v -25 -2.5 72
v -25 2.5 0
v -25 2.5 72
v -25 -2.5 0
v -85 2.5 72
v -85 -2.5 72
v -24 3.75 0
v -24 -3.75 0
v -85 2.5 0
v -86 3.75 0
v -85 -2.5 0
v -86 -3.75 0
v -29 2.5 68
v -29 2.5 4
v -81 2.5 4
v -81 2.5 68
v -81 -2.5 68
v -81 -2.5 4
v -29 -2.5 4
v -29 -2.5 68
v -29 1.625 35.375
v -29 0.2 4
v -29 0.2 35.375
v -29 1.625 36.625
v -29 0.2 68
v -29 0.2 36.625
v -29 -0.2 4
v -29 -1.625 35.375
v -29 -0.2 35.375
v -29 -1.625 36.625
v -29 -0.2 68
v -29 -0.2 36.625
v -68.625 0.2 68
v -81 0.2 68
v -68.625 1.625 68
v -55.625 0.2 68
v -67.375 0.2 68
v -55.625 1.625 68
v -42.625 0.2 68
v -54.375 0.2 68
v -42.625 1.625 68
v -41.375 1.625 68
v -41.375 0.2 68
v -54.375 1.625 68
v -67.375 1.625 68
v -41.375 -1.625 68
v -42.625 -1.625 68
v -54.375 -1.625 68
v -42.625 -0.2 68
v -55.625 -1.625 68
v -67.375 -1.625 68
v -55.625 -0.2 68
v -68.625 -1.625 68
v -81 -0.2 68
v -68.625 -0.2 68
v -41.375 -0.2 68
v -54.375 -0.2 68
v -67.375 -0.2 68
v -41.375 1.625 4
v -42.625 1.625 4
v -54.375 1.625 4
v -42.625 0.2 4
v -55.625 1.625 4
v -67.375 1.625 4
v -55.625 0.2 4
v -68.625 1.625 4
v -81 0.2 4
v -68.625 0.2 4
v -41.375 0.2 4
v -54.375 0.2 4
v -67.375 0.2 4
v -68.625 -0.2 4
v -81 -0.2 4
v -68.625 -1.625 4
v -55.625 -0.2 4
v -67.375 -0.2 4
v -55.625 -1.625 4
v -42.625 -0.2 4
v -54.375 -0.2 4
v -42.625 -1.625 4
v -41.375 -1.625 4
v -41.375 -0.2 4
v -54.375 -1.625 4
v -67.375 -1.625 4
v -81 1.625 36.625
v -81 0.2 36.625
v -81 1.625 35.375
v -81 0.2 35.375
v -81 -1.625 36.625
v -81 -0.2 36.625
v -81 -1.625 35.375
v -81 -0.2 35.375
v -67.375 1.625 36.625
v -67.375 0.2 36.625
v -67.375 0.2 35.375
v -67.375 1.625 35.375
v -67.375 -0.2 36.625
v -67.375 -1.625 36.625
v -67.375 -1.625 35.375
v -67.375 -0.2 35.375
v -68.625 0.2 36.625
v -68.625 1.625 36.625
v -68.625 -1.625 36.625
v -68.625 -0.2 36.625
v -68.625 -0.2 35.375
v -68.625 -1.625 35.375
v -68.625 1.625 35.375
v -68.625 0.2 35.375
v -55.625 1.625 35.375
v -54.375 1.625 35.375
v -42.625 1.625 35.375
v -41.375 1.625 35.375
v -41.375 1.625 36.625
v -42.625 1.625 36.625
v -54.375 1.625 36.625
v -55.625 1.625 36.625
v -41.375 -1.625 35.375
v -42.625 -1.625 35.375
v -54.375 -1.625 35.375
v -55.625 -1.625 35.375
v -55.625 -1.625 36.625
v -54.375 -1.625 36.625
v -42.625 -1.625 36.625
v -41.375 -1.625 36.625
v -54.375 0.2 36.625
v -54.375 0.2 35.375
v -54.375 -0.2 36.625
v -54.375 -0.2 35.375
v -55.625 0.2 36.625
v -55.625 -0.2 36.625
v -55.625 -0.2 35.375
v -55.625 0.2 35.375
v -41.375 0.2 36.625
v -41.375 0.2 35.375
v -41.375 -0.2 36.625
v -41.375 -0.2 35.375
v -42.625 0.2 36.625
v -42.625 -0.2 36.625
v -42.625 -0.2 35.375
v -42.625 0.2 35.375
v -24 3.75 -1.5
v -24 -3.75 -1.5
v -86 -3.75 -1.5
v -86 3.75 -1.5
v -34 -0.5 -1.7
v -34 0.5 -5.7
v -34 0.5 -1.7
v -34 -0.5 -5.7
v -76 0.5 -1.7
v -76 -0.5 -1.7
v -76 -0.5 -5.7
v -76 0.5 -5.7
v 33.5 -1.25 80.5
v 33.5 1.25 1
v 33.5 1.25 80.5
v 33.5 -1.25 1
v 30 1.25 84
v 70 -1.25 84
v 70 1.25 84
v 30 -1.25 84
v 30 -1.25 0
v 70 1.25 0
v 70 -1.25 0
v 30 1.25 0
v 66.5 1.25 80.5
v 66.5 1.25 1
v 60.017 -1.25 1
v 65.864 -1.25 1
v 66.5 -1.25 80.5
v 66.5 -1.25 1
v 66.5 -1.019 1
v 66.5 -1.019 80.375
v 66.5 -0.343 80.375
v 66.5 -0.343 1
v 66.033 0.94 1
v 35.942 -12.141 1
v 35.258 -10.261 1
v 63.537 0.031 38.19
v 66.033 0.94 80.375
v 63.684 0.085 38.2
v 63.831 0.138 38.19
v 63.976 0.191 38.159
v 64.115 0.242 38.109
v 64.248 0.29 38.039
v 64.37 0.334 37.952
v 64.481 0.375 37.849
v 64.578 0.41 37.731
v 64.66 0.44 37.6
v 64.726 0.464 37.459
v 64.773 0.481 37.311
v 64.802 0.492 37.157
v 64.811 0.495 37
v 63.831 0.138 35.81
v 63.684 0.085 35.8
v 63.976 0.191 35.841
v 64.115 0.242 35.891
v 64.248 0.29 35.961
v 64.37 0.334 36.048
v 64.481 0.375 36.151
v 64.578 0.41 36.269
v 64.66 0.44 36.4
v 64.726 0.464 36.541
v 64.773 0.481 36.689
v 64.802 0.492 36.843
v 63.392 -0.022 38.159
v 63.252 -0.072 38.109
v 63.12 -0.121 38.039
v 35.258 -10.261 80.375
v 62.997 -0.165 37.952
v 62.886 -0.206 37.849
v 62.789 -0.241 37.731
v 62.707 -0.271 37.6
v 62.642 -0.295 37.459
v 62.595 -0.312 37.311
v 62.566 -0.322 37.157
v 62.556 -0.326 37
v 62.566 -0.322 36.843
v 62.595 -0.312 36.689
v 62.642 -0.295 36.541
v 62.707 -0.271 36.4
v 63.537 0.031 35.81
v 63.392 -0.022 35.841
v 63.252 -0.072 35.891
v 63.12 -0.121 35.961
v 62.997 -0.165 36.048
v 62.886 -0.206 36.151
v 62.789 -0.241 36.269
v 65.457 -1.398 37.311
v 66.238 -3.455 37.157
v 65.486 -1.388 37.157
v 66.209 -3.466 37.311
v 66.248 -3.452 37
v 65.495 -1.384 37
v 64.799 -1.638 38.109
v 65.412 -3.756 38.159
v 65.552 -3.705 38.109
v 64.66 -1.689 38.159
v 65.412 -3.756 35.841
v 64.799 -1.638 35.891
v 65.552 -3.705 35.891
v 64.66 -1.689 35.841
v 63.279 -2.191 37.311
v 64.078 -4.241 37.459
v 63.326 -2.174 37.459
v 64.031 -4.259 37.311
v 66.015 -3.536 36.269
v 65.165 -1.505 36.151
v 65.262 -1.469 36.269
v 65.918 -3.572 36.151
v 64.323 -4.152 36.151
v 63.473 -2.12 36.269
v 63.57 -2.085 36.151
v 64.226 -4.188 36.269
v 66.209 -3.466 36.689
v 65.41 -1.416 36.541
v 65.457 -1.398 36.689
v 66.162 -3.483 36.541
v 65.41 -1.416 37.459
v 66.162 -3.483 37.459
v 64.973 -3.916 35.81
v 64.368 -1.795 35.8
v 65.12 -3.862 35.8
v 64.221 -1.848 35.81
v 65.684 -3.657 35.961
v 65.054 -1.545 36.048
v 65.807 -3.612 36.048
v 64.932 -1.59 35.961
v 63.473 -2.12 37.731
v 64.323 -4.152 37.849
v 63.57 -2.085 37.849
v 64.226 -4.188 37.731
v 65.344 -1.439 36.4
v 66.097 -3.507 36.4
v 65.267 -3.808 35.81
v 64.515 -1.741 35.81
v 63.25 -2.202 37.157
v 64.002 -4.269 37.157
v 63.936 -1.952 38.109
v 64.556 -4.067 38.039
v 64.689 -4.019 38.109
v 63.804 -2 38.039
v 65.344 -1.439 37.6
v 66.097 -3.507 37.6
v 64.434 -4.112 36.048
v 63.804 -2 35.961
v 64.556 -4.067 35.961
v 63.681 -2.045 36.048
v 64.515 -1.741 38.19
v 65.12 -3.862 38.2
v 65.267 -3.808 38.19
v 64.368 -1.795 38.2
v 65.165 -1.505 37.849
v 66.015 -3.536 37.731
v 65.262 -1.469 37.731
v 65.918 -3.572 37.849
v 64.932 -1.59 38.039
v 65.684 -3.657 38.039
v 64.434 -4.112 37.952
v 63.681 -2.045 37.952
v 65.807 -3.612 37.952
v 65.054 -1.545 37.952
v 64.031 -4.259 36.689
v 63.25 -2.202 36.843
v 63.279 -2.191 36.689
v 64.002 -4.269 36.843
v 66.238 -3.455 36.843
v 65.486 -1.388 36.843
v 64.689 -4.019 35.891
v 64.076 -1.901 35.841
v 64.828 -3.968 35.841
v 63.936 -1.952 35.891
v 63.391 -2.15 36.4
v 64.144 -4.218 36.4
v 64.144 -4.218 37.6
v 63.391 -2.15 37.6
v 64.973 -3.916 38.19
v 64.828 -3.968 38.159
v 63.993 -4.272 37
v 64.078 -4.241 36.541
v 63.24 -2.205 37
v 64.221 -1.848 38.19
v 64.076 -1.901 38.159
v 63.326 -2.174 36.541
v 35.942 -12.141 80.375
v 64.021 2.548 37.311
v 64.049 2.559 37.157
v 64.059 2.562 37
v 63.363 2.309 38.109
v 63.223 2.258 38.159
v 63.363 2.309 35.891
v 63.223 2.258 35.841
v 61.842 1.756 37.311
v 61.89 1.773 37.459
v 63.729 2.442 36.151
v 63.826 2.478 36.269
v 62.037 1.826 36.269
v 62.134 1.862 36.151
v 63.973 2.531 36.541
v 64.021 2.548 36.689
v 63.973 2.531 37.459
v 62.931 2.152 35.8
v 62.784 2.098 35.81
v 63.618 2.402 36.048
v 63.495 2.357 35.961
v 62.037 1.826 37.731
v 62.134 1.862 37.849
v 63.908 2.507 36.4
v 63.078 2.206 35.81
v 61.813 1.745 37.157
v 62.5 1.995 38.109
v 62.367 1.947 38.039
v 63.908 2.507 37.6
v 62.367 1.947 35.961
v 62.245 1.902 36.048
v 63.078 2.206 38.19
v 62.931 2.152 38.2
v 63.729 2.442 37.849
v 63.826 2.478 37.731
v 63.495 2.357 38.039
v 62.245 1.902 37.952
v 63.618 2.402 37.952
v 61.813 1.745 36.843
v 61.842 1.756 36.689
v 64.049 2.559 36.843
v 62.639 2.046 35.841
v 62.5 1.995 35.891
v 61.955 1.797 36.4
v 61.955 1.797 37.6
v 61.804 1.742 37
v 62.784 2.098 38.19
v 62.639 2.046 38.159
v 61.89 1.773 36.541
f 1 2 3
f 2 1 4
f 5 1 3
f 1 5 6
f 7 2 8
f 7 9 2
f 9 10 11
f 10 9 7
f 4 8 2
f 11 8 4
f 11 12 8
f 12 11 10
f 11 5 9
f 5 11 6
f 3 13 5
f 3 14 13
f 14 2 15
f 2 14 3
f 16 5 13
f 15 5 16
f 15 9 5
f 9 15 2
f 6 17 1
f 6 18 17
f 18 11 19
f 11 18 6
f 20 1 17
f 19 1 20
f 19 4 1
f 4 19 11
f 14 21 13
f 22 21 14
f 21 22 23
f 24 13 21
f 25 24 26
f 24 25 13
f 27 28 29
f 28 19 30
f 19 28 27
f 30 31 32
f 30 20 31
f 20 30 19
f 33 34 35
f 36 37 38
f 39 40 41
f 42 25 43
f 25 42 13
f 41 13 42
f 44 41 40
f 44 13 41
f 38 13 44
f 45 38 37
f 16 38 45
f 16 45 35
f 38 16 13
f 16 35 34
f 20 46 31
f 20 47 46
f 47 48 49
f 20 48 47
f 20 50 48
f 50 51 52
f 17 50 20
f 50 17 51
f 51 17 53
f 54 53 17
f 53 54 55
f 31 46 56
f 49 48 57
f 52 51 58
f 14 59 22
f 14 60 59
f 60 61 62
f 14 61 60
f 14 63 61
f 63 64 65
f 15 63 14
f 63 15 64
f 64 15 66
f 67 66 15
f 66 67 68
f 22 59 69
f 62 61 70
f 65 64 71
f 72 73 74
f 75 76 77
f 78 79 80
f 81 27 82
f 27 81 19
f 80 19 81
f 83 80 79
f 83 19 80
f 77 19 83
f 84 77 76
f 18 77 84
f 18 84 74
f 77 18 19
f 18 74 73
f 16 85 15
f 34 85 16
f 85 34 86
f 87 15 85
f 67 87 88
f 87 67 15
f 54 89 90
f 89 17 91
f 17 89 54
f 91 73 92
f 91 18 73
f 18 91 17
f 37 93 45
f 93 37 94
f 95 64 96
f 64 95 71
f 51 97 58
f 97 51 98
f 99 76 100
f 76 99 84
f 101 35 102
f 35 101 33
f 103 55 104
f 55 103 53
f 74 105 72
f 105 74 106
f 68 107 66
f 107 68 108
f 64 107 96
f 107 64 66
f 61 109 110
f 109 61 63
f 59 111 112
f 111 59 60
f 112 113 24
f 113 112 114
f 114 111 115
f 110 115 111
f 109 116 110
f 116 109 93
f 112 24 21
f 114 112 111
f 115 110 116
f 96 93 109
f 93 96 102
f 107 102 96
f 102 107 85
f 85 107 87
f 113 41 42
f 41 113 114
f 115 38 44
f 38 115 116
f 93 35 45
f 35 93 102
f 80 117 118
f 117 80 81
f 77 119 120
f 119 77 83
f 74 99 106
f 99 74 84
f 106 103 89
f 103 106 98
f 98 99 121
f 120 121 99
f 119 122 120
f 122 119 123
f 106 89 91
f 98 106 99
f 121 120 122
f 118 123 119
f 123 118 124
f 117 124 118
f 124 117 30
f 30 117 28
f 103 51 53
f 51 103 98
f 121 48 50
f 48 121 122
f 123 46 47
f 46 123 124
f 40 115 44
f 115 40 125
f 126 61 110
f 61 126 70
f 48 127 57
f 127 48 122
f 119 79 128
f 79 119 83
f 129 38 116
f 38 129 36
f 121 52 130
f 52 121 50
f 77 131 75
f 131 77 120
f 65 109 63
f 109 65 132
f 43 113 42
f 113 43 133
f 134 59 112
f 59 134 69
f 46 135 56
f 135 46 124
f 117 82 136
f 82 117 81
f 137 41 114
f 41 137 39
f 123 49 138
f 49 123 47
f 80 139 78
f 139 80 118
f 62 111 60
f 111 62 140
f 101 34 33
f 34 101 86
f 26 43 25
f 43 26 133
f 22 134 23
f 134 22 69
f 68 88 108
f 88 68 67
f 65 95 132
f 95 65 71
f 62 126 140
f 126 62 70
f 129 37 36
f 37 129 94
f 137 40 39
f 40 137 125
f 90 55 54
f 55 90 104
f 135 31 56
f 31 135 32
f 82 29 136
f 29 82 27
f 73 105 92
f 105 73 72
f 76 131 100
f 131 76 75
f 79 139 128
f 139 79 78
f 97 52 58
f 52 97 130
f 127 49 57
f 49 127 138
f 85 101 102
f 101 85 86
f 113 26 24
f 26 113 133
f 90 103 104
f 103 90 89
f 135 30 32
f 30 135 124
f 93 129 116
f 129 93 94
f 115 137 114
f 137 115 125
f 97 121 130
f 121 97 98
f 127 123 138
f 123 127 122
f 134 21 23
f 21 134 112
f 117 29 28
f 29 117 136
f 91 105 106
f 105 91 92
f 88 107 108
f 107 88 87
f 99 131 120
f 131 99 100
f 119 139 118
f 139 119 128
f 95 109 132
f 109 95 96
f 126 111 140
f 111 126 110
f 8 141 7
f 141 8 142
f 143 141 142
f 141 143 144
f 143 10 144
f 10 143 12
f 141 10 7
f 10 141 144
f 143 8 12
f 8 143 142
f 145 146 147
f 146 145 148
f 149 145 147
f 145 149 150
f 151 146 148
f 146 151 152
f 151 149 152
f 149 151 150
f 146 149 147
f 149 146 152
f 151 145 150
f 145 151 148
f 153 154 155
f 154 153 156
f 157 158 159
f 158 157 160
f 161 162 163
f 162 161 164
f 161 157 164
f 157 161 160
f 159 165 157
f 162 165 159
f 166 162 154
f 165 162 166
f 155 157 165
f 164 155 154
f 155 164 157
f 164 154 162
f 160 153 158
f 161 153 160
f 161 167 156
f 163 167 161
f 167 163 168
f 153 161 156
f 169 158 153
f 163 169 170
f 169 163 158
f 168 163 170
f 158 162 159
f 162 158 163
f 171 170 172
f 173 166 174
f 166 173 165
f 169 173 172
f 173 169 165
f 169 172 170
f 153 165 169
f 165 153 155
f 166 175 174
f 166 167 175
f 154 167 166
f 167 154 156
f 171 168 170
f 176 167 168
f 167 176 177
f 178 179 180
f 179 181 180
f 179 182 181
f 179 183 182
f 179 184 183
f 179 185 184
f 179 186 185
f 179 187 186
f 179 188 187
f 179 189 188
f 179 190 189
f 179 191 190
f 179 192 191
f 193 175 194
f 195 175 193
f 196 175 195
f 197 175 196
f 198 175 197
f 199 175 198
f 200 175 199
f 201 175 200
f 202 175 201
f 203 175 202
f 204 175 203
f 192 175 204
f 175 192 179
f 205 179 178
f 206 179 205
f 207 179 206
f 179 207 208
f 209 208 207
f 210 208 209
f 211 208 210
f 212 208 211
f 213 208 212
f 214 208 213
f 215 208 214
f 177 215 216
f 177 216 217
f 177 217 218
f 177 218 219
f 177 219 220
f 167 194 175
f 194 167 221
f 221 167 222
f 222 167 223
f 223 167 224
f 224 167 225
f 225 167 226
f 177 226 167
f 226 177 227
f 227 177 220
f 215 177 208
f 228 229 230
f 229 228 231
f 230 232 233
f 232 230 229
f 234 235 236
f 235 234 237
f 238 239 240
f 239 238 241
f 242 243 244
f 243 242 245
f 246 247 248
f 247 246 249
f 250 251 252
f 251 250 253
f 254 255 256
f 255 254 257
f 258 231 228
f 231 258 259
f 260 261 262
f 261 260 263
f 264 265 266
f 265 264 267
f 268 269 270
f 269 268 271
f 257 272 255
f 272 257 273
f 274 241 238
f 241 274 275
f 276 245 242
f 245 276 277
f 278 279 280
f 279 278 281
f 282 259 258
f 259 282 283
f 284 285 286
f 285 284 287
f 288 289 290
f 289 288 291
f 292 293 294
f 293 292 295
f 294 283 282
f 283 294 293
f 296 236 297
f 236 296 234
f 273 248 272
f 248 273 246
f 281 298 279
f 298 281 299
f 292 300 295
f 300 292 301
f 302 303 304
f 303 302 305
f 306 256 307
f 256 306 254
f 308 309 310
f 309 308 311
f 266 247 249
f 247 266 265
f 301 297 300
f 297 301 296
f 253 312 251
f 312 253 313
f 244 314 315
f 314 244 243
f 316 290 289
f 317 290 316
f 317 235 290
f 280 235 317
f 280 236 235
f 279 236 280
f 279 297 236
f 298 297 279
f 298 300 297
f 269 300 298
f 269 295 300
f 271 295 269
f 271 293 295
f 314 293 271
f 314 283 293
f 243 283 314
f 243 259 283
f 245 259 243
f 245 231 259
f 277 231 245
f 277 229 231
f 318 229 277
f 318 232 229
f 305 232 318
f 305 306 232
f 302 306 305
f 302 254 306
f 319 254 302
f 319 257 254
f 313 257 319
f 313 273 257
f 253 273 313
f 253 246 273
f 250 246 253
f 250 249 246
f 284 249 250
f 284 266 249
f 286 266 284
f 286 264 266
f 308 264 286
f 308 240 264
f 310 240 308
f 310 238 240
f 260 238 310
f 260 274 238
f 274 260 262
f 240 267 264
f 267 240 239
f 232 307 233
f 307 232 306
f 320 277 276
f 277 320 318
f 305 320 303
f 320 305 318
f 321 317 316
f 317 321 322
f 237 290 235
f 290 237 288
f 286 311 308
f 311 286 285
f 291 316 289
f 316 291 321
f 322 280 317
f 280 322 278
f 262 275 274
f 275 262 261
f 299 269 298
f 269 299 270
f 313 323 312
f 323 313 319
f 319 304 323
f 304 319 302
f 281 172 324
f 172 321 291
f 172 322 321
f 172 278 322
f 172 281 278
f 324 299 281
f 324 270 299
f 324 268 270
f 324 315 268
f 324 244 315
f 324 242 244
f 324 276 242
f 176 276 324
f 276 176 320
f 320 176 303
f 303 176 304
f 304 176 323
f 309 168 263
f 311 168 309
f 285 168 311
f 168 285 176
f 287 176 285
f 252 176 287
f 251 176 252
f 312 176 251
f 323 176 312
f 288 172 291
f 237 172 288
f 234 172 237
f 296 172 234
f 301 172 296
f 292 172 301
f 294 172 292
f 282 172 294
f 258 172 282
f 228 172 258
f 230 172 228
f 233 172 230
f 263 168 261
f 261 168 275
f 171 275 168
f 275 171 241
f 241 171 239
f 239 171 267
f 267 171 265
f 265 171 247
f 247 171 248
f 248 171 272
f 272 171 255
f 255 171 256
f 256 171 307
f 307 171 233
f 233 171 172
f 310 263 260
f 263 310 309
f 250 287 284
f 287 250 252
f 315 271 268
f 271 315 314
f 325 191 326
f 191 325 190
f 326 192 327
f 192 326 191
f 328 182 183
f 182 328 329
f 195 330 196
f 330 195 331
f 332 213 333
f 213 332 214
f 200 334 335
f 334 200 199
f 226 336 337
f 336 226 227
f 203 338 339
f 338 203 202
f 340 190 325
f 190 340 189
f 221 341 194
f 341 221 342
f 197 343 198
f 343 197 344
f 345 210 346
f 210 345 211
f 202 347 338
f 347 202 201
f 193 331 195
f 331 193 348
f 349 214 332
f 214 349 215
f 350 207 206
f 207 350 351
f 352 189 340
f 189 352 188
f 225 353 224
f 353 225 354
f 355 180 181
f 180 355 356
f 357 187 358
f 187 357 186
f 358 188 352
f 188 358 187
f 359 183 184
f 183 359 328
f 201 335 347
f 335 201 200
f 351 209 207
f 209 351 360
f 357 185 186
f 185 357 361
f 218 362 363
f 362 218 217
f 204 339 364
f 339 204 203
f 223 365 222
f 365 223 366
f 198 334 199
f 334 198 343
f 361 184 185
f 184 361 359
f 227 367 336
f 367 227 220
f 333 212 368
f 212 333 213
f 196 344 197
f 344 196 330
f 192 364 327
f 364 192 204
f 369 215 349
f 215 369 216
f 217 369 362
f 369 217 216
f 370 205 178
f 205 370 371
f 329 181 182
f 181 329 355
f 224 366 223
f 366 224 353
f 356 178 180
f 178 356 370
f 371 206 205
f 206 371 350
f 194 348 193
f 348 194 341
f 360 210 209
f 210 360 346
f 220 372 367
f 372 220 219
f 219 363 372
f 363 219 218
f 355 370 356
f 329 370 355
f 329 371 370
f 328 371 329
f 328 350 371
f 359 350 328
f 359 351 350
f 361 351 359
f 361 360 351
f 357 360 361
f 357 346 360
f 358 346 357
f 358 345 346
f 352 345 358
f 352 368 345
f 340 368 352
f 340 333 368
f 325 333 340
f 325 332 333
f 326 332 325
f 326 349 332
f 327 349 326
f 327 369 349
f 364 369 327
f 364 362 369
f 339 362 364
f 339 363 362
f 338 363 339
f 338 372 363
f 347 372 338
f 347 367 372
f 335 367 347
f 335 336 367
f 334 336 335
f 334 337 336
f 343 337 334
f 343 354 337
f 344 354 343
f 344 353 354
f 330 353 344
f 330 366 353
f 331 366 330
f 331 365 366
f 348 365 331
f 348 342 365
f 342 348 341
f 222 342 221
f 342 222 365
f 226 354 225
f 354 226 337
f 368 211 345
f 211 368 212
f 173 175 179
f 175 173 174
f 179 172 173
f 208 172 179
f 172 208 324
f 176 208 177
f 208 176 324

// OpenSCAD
// file: ../architectural_openings.scad
/*
  Parametric architectural openings library for OpenSCAD.
  OpenSCAD does not support classes, so this file uses reusable modules
  with named parameters to provide a class-like API.
*/

$fn = 48;

function clamp(value, low, high) = min(max(value, low), high);
function inner_size(outer, border) = max(outer - (border * 2), 0.01);

module box_centered(size) {
    translate([-size[0] / 2, -size[1] / 2, 0]) cube(size);
}

module frame_ring(width, depth, height, thickness) {
    inner_w = inner_size(width, thickness);
    inner_h = inner_size(height, thickness);

    difference() {
        box_centered([width, depth, height]);
        translate([0, 0, thickness])
            box_centered([inner_w, depth + 0.2, inner_h]);
    }
}

module door_frame(width, depth, height, thickness, threshold_height = 0) {
    clear_width = inner_size(width, thickness);

    translate([-(width - thickness) / 2, 0, 0])
        box_centered([thickness, depth, height]);

    translate([(width - thickness) / 2, 0, 0])
        box_centered([thickness, depth, height]);

    translate([0, 0, height - thickness])
        box_centered([width, depth, thickness]);

    if (threshold_height > 0) {
        translate([0, 0, 0])
            box_centered([clear_width, depth, threshold_height]);
    }
}

module trim_piece(width, depth, height, z = 0) {
    translate([0, 0, z]) box_centered([width, depth, height]);
}

module glass_panel(width, depth, height, z = 0) {
    color([0.70, 0.88, 0.98, 0.45])
        translate([0, 0, z]) box_centered([width, depth, height]);
}

module mullion_bar(length, thickness, depth, vertical = true, z = 0) {
    if (vertical) {
        translate([0, 0, z]) box_centered([thickness, depth, length]);
    } else {
        translate([0, 0, z]) box_centered([length, depth, thickness]);
    }
}

module decorative_door_panels(clear_width, slab_depth, clear_height, inset = 3, rail = 6) {
    panel_gap = rail;
    margin = rail * 1.2;
    panel_width = max((clear_width - margin * 2 - panel_gap) / 2, clear_width * 0.2);
    panel_height = max((clear_height - margin * 2 - panel_gap) / 2, clear_height * 0.2);
    emboss_depth = min(inset, slab_depth * 0.25);
    z_positions = [
        margin,
        margin + panel_height + panel_gap
    ];

    for (x_sign = [-1, 1]) {
        for (z_offset = z_positions) {
            x_offset = x_sign * (panel_width / 2 + panel_gap / 2);

            translate([x_offset, slab_depth / 2 - emboss_depth / 2, z_offset])
                difference() {
                    box_centered([panel_width, emboss_depth, panel_height]);
                    box_centered([
                        max(panel_width - rail * 2, 0.01),
                        emboss_depth + 0.1,
                        max(panel_height - rail * 2, 0.01)
                    ]);
                }
        }
    }
}

module door_leaf(
    width,
    depth,
    height,
    decorative = true,
    knob_radius = 1.2,
    knob_length = 2.2,
    knob_height = 36,
    knob_backset = 2.5
) {
    box_centered([width, depth, height]);

    if (decorative) {
        decorative_door_panels(
            clear_width = width * 0.82,
            slab_depth = depth,
            clear_height = height * 0.78
        );
    }

    knob_x = width / 2 - knob_backset;
    knob_z = clamp(knob_height, 6, height - 6);

    for (side = [-1, 1]) {
        translate([knob_x, side * (depth / 2 + knob_length / 2), knob_z])
            rotate([90, 0, 0])
                cylinder(h = knob_length, r = knob_radius, center = true);
    }
}

module window_unit(
    width = 48,
    depth = 5,
    height = 60,
    frame_thickness = 4,
    pane_cols = 2,
    pane_rows = 2,
    mullions = true,
    mullion_thickness = 1.25,
    has_sill = true,
    sill_height = 1.5,
    sill_projection = 2,
    has_apron = false,
    apron_height = 4,
    apron_thickness = 1,
    glass_thickness = 0.4
) {
    cols = max(floor(pane_cols), 1);
    rows = max(floor(pane_rows), 1);
    glass_width = inner_size(width, frame_thickness);
    glass_height = inner_size(height, frame_thickness);
    glass_z = frame_thickness;

    frame_ring(width, depth, height, frame_thickness);
    glass_panel(glass_width, glass_thickness, glass_height, glass_z);

    if (mullions && cols > 1) {
        pane_clear_w = glass_width / cols;

        for (i = [1 : cols - 1]) {
            x_pos = -glass_width / 2 + pane_clear_w * i;
            translate([x_pos, 0, frame_thickness])
                mullion_bar(glass_height, mullion_thickness, depth * 0.65, true);
        }
    }

    if (mullions && rows > 1) {
        pane_clear_h = glass_height / rows;

        for (i = [1 : rows - 1]) {
            z_pos = frame_thickness + pane_clear_h * i - mullion_thickness / 2;
            translate([0, 0, z_pos])
                mullion_bar(glass_width, mullion_thickness, depth * 0.65, false);
        }
    }

    if (has_sill) {
        trim_piece(
            width = width + frame_thickness * 0.5,
            depth = depth + sill_projection,
            height = sill_height,
            z = -sill_height
        );
    }

    if (has_apron) {
        trim_piece(
            width = width * 0.7,
            depth = apron_thickness,
            height = apron_height,
            z = -(has_sill ? sill_height : 0) - apron_height - 0.2
        );
    }
}

module door_unit(
    width = 36,
    depth = 2,
    height = 80,
    include_frame = true,
    frame_thickness = 3.5,
    functional = false,
    open_angle = 0,
    hinge = "left",
    decorative = true,
    reveal = 0.125,
    threshold_height = 1
) {
    clear_width = include_frame ? inner_size(width, frame_thickness) : width;
    clear_height = include_frame ? max(height - frame_thickness - threshold_height, 0.01) : height;
    slab_width = max(clear_width - reveal * 2, 0.01);
    slab_height = max(clear_height - reveal, 0.01);
    slab_depth = depth;
    hinge_sign = hinge == "right" ? 1 : -1;
    pivot_x = hinge_sign * slab_width / 2;
    closed_x = include_frame
        ? (hinge_sign == -1
            ? -width / 2 + frame_thickness + reveal + slab_width / 2
            : width / 2 - frame_thickness - reveal - slab_width / 2)
        : 0;
    slab_z = include_frame ? threshold_height : 0;

    if (include_frame) {
        door_frame(width, depth + 0.5, height, frame_thickness, threshold_height);
    }

    translate([closed_x, 0, slab_z]) {
        if (functional) {
            translate([pivot_x, 0, 0])
                rotate([0, 0, hinge_sign == -1 ? -open_angle : open_angle])
                    translate([-pivot_x, 0, 0])
                        door_leaf(
                            width = slab_width,
                            depth = slab_depth,
                            height = slab_height,
                            decorative = decorative
                        );
        } else {
            door_leaf(
                width = slab_width,
                depth = slab_depth,
                height = slab_height,
                decorative = decorative
            );
        }
    }
}

module demo_scene() {
    translate([-50, 0, 0])
        window_unit(
            width = 54,
            depth = 5,
            height = 64,
            pane_cols = 3,
            pane_rows = 2,
            mullions = true,
            has_sill = true,
            has_apron = true
        );

    translate([45, 0, 0])
        door_unit(
            width = 42,
            depth = 2,
            height = 84,
            include_frame = true,
            functional = true,
            open_angle = 28,
            hinge = "left",
            decorative = true
        );
}
// Open examples/demo_scene.scad for a ready-to-render preview scene.
// main file
use <../architectural_openings.scad>;

translate([-55, 0, 0])
    window_unit(
        width = 60,
        depth = 5,
        height = 72,
        frame_thickness = 4,
        pane_cols = 4,
        pane_rows = 2,
        mullions = true,
        has_sill = true,
        sill_projection = 2.5,
        has_apron = true
    );

translate([50, 0, 0])
    door_unit(
        width = 40,
        depth = 2,
        height = 84,
        include_frame = true,
        frame_thickness = 3.5,
        functional = true,
        open_angle = 20,
        hinge = "right",
        decorative = true,
        threshold_height = 1
    );
